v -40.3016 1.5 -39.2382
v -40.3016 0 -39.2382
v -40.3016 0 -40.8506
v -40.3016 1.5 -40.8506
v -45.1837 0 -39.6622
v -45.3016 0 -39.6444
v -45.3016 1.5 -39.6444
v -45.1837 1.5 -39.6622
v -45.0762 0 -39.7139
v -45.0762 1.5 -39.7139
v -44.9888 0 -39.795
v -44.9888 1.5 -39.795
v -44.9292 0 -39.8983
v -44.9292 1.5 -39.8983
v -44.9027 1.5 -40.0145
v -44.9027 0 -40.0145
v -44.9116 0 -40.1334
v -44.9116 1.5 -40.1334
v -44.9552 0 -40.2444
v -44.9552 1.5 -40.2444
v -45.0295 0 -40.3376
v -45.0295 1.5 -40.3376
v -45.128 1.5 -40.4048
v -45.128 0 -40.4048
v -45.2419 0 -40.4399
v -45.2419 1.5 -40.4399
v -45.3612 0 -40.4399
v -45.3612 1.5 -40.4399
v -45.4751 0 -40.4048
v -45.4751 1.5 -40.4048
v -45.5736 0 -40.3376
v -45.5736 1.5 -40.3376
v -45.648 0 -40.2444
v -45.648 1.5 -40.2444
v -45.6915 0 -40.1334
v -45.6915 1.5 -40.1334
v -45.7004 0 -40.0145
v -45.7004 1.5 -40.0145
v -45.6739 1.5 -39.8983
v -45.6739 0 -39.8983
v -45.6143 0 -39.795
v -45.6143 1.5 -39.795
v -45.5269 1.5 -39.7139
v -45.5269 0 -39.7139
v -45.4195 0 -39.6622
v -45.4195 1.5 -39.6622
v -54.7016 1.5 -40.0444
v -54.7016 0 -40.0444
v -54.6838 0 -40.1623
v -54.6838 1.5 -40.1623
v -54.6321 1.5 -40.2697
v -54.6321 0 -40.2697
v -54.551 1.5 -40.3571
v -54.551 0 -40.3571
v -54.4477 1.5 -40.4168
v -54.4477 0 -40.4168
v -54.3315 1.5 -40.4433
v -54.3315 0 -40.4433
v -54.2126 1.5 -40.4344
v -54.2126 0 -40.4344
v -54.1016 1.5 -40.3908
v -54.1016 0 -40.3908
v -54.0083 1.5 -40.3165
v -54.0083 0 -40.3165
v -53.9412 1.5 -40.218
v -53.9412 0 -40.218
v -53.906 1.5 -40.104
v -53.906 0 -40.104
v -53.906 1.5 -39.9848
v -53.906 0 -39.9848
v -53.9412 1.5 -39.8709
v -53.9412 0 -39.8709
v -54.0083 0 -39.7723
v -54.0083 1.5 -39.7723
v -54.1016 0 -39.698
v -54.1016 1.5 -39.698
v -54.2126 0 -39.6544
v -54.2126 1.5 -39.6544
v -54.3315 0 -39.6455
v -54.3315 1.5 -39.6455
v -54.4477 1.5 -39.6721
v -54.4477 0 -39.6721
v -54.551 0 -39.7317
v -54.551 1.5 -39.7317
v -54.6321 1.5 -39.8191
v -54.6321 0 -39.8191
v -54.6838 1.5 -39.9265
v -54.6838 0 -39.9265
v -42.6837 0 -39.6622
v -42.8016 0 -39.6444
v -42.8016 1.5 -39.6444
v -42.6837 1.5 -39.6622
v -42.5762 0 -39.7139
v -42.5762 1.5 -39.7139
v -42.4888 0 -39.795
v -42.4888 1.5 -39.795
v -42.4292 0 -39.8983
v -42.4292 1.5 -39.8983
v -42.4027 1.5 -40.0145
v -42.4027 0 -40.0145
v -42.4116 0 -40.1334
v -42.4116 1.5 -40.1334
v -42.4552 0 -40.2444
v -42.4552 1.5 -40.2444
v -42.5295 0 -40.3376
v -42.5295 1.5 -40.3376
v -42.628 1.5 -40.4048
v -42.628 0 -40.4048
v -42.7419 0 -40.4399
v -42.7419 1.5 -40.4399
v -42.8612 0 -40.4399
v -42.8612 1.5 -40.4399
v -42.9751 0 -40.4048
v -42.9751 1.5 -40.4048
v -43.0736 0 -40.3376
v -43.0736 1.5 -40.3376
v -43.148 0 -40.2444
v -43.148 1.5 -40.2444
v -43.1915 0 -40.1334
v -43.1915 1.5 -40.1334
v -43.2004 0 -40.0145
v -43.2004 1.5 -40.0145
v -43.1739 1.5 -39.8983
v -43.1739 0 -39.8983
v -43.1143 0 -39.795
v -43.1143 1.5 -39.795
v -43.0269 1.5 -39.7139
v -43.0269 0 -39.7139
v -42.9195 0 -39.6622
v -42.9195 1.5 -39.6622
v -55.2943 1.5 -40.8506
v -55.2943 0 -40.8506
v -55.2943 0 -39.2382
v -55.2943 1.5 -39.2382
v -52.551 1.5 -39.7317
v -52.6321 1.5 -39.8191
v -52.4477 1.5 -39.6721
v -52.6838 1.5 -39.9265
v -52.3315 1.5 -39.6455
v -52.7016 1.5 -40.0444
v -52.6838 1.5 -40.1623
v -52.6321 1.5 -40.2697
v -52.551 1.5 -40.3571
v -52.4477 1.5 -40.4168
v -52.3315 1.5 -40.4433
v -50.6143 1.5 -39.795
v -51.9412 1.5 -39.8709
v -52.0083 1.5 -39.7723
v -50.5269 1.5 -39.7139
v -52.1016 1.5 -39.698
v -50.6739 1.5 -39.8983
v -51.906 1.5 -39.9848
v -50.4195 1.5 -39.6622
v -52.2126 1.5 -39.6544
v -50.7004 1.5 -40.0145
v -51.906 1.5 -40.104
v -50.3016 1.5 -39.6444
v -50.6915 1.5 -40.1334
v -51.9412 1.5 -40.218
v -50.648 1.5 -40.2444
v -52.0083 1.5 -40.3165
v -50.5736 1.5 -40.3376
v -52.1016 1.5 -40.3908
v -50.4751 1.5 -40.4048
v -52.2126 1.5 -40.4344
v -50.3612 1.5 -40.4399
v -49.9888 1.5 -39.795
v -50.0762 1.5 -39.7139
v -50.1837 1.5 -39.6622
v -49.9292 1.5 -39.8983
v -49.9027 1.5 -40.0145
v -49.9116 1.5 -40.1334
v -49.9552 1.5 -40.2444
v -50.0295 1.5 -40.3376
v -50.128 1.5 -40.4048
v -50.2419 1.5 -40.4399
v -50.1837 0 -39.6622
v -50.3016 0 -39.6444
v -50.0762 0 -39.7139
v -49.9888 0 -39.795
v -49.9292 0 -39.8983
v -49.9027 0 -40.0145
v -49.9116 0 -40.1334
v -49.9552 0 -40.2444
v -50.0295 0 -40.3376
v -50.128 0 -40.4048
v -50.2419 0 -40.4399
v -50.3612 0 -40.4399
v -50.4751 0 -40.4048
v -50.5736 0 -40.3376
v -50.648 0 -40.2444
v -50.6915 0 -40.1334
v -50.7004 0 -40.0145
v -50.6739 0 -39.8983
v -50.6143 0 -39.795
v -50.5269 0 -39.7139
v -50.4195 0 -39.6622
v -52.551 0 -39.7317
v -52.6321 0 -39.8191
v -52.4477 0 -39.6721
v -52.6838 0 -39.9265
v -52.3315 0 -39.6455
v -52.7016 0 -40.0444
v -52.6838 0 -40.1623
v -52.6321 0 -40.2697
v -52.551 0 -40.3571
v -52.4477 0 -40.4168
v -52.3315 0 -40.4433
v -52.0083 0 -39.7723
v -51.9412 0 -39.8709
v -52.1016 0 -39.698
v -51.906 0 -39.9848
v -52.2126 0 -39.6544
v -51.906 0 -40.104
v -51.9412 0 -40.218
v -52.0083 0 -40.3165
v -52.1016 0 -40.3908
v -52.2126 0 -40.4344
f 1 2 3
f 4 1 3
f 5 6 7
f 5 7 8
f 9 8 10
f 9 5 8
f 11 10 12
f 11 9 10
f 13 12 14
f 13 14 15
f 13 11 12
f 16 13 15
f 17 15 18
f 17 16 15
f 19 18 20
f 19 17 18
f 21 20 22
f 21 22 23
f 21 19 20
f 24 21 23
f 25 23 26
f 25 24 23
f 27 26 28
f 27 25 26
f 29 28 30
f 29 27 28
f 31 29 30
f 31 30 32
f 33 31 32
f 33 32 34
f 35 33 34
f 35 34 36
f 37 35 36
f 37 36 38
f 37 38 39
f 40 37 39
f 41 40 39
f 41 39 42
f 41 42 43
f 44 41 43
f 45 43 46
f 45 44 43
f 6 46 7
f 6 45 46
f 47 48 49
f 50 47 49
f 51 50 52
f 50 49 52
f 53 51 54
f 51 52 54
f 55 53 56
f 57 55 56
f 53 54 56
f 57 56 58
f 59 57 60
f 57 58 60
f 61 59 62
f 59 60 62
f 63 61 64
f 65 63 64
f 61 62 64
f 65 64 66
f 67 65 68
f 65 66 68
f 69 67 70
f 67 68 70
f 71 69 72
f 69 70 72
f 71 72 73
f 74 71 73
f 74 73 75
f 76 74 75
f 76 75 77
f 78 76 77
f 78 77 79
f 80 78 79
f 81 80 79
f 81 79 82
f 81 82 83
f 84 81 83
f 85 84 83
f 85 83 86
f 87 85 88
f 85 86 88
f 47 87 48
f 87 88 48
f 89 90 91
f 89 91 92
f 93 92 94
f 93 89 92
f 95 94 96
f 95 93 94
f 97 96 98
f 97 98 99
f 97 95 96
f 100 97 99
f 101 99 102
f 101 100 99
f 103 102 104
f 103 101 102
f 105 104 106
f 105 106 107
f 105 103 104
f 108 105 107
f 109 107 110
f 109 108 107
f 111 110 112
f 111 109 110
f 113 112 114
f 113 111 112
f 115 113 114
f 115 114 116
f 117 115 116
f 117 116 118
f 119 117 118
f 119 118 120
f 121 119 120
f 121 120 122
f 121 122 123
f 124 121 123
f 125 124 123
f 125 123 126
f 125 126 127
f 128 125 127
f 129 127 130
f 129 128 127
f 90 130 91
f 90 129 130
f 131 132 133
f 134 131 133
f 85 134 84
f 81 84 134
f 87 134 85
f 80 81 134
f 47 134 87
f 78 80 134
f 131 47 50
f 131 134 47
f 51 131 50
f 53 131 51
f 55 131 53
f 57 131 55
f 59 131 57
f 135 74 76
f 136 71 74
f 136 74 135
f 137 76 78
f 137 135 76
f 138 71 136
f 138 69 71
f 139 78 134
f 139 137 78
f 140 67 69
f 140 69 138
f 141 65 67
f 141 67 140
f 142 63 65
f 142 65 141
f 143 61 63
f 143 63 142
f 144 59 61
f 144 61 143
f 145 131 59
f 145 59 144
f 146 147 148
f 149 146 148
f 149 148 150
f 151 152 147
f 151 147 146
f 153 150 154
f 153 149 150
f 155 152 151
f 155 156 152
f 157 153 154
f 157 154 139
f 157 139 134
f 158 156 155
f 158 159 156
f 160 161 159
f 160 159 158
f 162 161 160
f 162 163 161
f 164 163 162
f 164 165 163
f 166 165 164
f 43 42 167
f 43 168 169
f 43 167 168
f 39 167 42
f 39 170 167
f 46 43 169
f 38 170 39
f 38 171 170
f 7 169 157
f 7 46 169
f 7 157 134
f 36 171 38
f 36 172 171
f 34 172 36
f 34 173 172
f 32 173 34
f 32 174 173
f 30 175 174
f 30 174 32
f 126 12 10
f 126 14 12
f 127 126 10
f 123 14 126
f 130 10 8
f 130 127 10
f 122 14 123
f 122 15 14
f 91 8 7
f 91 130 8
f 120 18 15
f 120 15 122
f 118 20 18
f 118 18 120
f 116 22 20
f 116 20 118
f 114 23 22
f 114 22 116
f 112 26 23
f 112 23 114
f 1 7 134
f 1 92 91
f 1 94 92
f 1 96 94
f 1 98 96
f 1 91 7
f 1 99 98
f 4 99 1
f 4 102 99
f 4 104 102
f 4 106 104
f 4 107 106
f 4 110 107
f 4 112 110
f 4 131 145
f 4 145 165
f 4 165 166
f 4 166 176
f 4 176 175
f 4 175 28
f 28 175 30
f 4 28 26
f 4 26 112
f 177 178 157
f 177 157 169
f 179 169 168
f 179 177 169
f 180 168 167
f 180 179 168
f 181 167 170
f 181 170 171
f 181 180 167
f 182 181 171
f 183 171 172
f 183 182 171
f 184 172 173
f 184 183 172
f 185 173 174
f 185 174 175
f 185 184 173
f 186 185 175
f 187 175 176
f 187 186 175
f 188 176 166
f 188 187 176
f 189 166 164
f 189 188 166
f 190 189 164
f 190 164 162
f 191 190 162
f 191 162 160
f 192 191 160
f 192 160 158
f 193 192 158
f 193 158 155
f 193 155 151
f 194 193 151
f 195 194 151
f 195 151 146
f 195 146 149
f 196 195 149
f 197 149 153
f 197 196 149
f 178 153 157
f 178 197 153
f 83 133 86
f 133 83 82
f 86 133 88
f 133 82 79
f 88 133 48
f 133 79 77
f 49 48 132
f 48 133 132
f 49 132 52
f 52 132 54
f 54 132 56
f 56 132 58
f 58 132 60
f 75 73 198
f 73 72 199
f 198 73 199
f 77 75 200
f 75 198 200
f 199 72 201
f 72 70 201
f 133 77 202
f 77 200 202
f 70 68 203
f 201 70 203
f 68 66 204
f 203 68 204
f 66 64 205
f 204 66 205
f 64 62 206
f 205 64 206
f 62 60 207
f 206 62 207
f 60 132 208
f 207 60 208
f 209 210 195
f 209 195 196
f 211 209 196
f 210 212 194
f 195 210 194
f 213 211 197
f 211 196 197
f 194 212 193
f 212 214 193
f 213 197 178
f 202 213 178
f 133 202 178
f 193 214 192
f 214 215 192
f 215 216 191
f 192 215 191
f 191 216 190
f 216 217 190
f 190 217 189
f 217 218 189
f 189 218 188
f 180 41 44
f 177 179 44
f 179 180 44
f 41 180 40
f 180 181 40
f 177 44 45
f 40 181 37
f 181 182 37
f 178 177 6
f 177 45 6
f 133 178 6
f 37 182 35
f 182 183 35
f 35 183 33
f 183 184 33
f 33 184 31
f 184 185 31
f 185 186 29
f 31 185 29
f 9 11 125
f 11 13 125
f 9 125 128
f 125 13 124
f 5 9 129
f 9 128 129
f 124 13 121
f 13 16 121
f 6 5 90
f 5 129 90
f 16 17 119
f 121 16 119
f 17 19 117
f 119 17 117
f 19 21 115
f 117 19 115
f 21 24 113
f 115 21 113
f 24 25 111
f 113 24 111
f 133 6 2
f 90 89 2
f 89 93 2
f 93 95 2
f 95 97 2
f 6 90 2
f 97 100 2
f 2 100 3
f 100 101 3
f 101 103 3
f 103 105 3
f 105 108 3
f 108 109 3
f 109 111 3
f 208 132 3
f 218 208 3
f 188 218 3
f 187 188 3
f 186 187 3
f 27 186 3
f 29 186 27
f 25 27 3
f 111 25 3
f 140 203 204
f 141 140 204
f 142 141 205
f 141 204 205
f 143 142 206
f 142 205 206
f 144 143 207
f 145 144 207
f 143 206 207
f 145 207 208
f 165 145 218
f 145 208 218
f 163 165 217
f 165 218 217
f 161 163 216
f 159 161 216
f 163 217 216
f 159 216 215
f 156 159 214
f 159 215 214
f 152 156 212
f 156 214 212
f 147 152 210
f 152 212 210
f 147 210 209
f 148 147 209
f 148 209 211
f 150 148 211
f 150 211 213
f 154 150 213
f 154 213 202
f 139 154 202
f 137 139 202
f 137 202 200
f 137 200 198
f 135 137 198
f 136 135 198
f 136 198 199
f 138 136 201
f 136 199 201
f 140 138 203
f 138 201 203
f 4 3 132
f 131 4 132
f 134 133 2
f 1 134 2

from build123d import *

# Parameters (mm, degrees)
SKETCH1_R           = 0.4
BOSS_EXTRUDE1_DEPTH = 1.5


with BuildPart() as part:
    # Sketch1 → Boss-Extrude1 (new body)
    with BuildSketch(Plane(origin=(0, 0, 0), x_dir=(1, 0, 0), z_dir=(0, 1, 0))):
        Polygon((-55.29426973, 40.850641592), (-55.29426973, 40.044415817), (-55.29426973, 39.238190042), (-40.301565833, 39.238190042), (-40.301565833, 40.850641592), align=None)
        with BuildLine():
            ThreePointArc((-51.901565833, 40.044415817), (-52.301565833, 39.644415817), (-52.701565833, 40.044415817))
            ThreePointArc((-52.701565833, 40.044415817), (-52.301565833, 40.444415817), (-51.901565833, 40.044415817))
        make_face(mode=Mode.SUBTRACT)
        with BuildLine():
            ThreePointArc((-53.901565833, 40.044415817), (-54.301565833, 39.644415817), (-54.701565833, 40.044415817))
            ThreePointArc((-54.701565833, 40.044415817), (-54.301565833, 40.444415817), (-53.901565833, 40.044415817))
        make_face(mode=Mode.SUBTRACT)
        with Locations((-50.301565833, 40.044415817)):
            Circle(SKETCH1_R, mode=Mode.SUBTRACT)
        with Locations((-45.301565833, 40.044415817)):
            Circle(SKETCH1_R, mode=Mode.SUBTRACT)
        with Locations((-42.801565833, 40.044415817)):
            Circle(SKETCH1_R, mode=Mode.SUBTRACT)
    extrude(amount=BOSS_EXTRUDE1_DEPTH)


solid = part.part
